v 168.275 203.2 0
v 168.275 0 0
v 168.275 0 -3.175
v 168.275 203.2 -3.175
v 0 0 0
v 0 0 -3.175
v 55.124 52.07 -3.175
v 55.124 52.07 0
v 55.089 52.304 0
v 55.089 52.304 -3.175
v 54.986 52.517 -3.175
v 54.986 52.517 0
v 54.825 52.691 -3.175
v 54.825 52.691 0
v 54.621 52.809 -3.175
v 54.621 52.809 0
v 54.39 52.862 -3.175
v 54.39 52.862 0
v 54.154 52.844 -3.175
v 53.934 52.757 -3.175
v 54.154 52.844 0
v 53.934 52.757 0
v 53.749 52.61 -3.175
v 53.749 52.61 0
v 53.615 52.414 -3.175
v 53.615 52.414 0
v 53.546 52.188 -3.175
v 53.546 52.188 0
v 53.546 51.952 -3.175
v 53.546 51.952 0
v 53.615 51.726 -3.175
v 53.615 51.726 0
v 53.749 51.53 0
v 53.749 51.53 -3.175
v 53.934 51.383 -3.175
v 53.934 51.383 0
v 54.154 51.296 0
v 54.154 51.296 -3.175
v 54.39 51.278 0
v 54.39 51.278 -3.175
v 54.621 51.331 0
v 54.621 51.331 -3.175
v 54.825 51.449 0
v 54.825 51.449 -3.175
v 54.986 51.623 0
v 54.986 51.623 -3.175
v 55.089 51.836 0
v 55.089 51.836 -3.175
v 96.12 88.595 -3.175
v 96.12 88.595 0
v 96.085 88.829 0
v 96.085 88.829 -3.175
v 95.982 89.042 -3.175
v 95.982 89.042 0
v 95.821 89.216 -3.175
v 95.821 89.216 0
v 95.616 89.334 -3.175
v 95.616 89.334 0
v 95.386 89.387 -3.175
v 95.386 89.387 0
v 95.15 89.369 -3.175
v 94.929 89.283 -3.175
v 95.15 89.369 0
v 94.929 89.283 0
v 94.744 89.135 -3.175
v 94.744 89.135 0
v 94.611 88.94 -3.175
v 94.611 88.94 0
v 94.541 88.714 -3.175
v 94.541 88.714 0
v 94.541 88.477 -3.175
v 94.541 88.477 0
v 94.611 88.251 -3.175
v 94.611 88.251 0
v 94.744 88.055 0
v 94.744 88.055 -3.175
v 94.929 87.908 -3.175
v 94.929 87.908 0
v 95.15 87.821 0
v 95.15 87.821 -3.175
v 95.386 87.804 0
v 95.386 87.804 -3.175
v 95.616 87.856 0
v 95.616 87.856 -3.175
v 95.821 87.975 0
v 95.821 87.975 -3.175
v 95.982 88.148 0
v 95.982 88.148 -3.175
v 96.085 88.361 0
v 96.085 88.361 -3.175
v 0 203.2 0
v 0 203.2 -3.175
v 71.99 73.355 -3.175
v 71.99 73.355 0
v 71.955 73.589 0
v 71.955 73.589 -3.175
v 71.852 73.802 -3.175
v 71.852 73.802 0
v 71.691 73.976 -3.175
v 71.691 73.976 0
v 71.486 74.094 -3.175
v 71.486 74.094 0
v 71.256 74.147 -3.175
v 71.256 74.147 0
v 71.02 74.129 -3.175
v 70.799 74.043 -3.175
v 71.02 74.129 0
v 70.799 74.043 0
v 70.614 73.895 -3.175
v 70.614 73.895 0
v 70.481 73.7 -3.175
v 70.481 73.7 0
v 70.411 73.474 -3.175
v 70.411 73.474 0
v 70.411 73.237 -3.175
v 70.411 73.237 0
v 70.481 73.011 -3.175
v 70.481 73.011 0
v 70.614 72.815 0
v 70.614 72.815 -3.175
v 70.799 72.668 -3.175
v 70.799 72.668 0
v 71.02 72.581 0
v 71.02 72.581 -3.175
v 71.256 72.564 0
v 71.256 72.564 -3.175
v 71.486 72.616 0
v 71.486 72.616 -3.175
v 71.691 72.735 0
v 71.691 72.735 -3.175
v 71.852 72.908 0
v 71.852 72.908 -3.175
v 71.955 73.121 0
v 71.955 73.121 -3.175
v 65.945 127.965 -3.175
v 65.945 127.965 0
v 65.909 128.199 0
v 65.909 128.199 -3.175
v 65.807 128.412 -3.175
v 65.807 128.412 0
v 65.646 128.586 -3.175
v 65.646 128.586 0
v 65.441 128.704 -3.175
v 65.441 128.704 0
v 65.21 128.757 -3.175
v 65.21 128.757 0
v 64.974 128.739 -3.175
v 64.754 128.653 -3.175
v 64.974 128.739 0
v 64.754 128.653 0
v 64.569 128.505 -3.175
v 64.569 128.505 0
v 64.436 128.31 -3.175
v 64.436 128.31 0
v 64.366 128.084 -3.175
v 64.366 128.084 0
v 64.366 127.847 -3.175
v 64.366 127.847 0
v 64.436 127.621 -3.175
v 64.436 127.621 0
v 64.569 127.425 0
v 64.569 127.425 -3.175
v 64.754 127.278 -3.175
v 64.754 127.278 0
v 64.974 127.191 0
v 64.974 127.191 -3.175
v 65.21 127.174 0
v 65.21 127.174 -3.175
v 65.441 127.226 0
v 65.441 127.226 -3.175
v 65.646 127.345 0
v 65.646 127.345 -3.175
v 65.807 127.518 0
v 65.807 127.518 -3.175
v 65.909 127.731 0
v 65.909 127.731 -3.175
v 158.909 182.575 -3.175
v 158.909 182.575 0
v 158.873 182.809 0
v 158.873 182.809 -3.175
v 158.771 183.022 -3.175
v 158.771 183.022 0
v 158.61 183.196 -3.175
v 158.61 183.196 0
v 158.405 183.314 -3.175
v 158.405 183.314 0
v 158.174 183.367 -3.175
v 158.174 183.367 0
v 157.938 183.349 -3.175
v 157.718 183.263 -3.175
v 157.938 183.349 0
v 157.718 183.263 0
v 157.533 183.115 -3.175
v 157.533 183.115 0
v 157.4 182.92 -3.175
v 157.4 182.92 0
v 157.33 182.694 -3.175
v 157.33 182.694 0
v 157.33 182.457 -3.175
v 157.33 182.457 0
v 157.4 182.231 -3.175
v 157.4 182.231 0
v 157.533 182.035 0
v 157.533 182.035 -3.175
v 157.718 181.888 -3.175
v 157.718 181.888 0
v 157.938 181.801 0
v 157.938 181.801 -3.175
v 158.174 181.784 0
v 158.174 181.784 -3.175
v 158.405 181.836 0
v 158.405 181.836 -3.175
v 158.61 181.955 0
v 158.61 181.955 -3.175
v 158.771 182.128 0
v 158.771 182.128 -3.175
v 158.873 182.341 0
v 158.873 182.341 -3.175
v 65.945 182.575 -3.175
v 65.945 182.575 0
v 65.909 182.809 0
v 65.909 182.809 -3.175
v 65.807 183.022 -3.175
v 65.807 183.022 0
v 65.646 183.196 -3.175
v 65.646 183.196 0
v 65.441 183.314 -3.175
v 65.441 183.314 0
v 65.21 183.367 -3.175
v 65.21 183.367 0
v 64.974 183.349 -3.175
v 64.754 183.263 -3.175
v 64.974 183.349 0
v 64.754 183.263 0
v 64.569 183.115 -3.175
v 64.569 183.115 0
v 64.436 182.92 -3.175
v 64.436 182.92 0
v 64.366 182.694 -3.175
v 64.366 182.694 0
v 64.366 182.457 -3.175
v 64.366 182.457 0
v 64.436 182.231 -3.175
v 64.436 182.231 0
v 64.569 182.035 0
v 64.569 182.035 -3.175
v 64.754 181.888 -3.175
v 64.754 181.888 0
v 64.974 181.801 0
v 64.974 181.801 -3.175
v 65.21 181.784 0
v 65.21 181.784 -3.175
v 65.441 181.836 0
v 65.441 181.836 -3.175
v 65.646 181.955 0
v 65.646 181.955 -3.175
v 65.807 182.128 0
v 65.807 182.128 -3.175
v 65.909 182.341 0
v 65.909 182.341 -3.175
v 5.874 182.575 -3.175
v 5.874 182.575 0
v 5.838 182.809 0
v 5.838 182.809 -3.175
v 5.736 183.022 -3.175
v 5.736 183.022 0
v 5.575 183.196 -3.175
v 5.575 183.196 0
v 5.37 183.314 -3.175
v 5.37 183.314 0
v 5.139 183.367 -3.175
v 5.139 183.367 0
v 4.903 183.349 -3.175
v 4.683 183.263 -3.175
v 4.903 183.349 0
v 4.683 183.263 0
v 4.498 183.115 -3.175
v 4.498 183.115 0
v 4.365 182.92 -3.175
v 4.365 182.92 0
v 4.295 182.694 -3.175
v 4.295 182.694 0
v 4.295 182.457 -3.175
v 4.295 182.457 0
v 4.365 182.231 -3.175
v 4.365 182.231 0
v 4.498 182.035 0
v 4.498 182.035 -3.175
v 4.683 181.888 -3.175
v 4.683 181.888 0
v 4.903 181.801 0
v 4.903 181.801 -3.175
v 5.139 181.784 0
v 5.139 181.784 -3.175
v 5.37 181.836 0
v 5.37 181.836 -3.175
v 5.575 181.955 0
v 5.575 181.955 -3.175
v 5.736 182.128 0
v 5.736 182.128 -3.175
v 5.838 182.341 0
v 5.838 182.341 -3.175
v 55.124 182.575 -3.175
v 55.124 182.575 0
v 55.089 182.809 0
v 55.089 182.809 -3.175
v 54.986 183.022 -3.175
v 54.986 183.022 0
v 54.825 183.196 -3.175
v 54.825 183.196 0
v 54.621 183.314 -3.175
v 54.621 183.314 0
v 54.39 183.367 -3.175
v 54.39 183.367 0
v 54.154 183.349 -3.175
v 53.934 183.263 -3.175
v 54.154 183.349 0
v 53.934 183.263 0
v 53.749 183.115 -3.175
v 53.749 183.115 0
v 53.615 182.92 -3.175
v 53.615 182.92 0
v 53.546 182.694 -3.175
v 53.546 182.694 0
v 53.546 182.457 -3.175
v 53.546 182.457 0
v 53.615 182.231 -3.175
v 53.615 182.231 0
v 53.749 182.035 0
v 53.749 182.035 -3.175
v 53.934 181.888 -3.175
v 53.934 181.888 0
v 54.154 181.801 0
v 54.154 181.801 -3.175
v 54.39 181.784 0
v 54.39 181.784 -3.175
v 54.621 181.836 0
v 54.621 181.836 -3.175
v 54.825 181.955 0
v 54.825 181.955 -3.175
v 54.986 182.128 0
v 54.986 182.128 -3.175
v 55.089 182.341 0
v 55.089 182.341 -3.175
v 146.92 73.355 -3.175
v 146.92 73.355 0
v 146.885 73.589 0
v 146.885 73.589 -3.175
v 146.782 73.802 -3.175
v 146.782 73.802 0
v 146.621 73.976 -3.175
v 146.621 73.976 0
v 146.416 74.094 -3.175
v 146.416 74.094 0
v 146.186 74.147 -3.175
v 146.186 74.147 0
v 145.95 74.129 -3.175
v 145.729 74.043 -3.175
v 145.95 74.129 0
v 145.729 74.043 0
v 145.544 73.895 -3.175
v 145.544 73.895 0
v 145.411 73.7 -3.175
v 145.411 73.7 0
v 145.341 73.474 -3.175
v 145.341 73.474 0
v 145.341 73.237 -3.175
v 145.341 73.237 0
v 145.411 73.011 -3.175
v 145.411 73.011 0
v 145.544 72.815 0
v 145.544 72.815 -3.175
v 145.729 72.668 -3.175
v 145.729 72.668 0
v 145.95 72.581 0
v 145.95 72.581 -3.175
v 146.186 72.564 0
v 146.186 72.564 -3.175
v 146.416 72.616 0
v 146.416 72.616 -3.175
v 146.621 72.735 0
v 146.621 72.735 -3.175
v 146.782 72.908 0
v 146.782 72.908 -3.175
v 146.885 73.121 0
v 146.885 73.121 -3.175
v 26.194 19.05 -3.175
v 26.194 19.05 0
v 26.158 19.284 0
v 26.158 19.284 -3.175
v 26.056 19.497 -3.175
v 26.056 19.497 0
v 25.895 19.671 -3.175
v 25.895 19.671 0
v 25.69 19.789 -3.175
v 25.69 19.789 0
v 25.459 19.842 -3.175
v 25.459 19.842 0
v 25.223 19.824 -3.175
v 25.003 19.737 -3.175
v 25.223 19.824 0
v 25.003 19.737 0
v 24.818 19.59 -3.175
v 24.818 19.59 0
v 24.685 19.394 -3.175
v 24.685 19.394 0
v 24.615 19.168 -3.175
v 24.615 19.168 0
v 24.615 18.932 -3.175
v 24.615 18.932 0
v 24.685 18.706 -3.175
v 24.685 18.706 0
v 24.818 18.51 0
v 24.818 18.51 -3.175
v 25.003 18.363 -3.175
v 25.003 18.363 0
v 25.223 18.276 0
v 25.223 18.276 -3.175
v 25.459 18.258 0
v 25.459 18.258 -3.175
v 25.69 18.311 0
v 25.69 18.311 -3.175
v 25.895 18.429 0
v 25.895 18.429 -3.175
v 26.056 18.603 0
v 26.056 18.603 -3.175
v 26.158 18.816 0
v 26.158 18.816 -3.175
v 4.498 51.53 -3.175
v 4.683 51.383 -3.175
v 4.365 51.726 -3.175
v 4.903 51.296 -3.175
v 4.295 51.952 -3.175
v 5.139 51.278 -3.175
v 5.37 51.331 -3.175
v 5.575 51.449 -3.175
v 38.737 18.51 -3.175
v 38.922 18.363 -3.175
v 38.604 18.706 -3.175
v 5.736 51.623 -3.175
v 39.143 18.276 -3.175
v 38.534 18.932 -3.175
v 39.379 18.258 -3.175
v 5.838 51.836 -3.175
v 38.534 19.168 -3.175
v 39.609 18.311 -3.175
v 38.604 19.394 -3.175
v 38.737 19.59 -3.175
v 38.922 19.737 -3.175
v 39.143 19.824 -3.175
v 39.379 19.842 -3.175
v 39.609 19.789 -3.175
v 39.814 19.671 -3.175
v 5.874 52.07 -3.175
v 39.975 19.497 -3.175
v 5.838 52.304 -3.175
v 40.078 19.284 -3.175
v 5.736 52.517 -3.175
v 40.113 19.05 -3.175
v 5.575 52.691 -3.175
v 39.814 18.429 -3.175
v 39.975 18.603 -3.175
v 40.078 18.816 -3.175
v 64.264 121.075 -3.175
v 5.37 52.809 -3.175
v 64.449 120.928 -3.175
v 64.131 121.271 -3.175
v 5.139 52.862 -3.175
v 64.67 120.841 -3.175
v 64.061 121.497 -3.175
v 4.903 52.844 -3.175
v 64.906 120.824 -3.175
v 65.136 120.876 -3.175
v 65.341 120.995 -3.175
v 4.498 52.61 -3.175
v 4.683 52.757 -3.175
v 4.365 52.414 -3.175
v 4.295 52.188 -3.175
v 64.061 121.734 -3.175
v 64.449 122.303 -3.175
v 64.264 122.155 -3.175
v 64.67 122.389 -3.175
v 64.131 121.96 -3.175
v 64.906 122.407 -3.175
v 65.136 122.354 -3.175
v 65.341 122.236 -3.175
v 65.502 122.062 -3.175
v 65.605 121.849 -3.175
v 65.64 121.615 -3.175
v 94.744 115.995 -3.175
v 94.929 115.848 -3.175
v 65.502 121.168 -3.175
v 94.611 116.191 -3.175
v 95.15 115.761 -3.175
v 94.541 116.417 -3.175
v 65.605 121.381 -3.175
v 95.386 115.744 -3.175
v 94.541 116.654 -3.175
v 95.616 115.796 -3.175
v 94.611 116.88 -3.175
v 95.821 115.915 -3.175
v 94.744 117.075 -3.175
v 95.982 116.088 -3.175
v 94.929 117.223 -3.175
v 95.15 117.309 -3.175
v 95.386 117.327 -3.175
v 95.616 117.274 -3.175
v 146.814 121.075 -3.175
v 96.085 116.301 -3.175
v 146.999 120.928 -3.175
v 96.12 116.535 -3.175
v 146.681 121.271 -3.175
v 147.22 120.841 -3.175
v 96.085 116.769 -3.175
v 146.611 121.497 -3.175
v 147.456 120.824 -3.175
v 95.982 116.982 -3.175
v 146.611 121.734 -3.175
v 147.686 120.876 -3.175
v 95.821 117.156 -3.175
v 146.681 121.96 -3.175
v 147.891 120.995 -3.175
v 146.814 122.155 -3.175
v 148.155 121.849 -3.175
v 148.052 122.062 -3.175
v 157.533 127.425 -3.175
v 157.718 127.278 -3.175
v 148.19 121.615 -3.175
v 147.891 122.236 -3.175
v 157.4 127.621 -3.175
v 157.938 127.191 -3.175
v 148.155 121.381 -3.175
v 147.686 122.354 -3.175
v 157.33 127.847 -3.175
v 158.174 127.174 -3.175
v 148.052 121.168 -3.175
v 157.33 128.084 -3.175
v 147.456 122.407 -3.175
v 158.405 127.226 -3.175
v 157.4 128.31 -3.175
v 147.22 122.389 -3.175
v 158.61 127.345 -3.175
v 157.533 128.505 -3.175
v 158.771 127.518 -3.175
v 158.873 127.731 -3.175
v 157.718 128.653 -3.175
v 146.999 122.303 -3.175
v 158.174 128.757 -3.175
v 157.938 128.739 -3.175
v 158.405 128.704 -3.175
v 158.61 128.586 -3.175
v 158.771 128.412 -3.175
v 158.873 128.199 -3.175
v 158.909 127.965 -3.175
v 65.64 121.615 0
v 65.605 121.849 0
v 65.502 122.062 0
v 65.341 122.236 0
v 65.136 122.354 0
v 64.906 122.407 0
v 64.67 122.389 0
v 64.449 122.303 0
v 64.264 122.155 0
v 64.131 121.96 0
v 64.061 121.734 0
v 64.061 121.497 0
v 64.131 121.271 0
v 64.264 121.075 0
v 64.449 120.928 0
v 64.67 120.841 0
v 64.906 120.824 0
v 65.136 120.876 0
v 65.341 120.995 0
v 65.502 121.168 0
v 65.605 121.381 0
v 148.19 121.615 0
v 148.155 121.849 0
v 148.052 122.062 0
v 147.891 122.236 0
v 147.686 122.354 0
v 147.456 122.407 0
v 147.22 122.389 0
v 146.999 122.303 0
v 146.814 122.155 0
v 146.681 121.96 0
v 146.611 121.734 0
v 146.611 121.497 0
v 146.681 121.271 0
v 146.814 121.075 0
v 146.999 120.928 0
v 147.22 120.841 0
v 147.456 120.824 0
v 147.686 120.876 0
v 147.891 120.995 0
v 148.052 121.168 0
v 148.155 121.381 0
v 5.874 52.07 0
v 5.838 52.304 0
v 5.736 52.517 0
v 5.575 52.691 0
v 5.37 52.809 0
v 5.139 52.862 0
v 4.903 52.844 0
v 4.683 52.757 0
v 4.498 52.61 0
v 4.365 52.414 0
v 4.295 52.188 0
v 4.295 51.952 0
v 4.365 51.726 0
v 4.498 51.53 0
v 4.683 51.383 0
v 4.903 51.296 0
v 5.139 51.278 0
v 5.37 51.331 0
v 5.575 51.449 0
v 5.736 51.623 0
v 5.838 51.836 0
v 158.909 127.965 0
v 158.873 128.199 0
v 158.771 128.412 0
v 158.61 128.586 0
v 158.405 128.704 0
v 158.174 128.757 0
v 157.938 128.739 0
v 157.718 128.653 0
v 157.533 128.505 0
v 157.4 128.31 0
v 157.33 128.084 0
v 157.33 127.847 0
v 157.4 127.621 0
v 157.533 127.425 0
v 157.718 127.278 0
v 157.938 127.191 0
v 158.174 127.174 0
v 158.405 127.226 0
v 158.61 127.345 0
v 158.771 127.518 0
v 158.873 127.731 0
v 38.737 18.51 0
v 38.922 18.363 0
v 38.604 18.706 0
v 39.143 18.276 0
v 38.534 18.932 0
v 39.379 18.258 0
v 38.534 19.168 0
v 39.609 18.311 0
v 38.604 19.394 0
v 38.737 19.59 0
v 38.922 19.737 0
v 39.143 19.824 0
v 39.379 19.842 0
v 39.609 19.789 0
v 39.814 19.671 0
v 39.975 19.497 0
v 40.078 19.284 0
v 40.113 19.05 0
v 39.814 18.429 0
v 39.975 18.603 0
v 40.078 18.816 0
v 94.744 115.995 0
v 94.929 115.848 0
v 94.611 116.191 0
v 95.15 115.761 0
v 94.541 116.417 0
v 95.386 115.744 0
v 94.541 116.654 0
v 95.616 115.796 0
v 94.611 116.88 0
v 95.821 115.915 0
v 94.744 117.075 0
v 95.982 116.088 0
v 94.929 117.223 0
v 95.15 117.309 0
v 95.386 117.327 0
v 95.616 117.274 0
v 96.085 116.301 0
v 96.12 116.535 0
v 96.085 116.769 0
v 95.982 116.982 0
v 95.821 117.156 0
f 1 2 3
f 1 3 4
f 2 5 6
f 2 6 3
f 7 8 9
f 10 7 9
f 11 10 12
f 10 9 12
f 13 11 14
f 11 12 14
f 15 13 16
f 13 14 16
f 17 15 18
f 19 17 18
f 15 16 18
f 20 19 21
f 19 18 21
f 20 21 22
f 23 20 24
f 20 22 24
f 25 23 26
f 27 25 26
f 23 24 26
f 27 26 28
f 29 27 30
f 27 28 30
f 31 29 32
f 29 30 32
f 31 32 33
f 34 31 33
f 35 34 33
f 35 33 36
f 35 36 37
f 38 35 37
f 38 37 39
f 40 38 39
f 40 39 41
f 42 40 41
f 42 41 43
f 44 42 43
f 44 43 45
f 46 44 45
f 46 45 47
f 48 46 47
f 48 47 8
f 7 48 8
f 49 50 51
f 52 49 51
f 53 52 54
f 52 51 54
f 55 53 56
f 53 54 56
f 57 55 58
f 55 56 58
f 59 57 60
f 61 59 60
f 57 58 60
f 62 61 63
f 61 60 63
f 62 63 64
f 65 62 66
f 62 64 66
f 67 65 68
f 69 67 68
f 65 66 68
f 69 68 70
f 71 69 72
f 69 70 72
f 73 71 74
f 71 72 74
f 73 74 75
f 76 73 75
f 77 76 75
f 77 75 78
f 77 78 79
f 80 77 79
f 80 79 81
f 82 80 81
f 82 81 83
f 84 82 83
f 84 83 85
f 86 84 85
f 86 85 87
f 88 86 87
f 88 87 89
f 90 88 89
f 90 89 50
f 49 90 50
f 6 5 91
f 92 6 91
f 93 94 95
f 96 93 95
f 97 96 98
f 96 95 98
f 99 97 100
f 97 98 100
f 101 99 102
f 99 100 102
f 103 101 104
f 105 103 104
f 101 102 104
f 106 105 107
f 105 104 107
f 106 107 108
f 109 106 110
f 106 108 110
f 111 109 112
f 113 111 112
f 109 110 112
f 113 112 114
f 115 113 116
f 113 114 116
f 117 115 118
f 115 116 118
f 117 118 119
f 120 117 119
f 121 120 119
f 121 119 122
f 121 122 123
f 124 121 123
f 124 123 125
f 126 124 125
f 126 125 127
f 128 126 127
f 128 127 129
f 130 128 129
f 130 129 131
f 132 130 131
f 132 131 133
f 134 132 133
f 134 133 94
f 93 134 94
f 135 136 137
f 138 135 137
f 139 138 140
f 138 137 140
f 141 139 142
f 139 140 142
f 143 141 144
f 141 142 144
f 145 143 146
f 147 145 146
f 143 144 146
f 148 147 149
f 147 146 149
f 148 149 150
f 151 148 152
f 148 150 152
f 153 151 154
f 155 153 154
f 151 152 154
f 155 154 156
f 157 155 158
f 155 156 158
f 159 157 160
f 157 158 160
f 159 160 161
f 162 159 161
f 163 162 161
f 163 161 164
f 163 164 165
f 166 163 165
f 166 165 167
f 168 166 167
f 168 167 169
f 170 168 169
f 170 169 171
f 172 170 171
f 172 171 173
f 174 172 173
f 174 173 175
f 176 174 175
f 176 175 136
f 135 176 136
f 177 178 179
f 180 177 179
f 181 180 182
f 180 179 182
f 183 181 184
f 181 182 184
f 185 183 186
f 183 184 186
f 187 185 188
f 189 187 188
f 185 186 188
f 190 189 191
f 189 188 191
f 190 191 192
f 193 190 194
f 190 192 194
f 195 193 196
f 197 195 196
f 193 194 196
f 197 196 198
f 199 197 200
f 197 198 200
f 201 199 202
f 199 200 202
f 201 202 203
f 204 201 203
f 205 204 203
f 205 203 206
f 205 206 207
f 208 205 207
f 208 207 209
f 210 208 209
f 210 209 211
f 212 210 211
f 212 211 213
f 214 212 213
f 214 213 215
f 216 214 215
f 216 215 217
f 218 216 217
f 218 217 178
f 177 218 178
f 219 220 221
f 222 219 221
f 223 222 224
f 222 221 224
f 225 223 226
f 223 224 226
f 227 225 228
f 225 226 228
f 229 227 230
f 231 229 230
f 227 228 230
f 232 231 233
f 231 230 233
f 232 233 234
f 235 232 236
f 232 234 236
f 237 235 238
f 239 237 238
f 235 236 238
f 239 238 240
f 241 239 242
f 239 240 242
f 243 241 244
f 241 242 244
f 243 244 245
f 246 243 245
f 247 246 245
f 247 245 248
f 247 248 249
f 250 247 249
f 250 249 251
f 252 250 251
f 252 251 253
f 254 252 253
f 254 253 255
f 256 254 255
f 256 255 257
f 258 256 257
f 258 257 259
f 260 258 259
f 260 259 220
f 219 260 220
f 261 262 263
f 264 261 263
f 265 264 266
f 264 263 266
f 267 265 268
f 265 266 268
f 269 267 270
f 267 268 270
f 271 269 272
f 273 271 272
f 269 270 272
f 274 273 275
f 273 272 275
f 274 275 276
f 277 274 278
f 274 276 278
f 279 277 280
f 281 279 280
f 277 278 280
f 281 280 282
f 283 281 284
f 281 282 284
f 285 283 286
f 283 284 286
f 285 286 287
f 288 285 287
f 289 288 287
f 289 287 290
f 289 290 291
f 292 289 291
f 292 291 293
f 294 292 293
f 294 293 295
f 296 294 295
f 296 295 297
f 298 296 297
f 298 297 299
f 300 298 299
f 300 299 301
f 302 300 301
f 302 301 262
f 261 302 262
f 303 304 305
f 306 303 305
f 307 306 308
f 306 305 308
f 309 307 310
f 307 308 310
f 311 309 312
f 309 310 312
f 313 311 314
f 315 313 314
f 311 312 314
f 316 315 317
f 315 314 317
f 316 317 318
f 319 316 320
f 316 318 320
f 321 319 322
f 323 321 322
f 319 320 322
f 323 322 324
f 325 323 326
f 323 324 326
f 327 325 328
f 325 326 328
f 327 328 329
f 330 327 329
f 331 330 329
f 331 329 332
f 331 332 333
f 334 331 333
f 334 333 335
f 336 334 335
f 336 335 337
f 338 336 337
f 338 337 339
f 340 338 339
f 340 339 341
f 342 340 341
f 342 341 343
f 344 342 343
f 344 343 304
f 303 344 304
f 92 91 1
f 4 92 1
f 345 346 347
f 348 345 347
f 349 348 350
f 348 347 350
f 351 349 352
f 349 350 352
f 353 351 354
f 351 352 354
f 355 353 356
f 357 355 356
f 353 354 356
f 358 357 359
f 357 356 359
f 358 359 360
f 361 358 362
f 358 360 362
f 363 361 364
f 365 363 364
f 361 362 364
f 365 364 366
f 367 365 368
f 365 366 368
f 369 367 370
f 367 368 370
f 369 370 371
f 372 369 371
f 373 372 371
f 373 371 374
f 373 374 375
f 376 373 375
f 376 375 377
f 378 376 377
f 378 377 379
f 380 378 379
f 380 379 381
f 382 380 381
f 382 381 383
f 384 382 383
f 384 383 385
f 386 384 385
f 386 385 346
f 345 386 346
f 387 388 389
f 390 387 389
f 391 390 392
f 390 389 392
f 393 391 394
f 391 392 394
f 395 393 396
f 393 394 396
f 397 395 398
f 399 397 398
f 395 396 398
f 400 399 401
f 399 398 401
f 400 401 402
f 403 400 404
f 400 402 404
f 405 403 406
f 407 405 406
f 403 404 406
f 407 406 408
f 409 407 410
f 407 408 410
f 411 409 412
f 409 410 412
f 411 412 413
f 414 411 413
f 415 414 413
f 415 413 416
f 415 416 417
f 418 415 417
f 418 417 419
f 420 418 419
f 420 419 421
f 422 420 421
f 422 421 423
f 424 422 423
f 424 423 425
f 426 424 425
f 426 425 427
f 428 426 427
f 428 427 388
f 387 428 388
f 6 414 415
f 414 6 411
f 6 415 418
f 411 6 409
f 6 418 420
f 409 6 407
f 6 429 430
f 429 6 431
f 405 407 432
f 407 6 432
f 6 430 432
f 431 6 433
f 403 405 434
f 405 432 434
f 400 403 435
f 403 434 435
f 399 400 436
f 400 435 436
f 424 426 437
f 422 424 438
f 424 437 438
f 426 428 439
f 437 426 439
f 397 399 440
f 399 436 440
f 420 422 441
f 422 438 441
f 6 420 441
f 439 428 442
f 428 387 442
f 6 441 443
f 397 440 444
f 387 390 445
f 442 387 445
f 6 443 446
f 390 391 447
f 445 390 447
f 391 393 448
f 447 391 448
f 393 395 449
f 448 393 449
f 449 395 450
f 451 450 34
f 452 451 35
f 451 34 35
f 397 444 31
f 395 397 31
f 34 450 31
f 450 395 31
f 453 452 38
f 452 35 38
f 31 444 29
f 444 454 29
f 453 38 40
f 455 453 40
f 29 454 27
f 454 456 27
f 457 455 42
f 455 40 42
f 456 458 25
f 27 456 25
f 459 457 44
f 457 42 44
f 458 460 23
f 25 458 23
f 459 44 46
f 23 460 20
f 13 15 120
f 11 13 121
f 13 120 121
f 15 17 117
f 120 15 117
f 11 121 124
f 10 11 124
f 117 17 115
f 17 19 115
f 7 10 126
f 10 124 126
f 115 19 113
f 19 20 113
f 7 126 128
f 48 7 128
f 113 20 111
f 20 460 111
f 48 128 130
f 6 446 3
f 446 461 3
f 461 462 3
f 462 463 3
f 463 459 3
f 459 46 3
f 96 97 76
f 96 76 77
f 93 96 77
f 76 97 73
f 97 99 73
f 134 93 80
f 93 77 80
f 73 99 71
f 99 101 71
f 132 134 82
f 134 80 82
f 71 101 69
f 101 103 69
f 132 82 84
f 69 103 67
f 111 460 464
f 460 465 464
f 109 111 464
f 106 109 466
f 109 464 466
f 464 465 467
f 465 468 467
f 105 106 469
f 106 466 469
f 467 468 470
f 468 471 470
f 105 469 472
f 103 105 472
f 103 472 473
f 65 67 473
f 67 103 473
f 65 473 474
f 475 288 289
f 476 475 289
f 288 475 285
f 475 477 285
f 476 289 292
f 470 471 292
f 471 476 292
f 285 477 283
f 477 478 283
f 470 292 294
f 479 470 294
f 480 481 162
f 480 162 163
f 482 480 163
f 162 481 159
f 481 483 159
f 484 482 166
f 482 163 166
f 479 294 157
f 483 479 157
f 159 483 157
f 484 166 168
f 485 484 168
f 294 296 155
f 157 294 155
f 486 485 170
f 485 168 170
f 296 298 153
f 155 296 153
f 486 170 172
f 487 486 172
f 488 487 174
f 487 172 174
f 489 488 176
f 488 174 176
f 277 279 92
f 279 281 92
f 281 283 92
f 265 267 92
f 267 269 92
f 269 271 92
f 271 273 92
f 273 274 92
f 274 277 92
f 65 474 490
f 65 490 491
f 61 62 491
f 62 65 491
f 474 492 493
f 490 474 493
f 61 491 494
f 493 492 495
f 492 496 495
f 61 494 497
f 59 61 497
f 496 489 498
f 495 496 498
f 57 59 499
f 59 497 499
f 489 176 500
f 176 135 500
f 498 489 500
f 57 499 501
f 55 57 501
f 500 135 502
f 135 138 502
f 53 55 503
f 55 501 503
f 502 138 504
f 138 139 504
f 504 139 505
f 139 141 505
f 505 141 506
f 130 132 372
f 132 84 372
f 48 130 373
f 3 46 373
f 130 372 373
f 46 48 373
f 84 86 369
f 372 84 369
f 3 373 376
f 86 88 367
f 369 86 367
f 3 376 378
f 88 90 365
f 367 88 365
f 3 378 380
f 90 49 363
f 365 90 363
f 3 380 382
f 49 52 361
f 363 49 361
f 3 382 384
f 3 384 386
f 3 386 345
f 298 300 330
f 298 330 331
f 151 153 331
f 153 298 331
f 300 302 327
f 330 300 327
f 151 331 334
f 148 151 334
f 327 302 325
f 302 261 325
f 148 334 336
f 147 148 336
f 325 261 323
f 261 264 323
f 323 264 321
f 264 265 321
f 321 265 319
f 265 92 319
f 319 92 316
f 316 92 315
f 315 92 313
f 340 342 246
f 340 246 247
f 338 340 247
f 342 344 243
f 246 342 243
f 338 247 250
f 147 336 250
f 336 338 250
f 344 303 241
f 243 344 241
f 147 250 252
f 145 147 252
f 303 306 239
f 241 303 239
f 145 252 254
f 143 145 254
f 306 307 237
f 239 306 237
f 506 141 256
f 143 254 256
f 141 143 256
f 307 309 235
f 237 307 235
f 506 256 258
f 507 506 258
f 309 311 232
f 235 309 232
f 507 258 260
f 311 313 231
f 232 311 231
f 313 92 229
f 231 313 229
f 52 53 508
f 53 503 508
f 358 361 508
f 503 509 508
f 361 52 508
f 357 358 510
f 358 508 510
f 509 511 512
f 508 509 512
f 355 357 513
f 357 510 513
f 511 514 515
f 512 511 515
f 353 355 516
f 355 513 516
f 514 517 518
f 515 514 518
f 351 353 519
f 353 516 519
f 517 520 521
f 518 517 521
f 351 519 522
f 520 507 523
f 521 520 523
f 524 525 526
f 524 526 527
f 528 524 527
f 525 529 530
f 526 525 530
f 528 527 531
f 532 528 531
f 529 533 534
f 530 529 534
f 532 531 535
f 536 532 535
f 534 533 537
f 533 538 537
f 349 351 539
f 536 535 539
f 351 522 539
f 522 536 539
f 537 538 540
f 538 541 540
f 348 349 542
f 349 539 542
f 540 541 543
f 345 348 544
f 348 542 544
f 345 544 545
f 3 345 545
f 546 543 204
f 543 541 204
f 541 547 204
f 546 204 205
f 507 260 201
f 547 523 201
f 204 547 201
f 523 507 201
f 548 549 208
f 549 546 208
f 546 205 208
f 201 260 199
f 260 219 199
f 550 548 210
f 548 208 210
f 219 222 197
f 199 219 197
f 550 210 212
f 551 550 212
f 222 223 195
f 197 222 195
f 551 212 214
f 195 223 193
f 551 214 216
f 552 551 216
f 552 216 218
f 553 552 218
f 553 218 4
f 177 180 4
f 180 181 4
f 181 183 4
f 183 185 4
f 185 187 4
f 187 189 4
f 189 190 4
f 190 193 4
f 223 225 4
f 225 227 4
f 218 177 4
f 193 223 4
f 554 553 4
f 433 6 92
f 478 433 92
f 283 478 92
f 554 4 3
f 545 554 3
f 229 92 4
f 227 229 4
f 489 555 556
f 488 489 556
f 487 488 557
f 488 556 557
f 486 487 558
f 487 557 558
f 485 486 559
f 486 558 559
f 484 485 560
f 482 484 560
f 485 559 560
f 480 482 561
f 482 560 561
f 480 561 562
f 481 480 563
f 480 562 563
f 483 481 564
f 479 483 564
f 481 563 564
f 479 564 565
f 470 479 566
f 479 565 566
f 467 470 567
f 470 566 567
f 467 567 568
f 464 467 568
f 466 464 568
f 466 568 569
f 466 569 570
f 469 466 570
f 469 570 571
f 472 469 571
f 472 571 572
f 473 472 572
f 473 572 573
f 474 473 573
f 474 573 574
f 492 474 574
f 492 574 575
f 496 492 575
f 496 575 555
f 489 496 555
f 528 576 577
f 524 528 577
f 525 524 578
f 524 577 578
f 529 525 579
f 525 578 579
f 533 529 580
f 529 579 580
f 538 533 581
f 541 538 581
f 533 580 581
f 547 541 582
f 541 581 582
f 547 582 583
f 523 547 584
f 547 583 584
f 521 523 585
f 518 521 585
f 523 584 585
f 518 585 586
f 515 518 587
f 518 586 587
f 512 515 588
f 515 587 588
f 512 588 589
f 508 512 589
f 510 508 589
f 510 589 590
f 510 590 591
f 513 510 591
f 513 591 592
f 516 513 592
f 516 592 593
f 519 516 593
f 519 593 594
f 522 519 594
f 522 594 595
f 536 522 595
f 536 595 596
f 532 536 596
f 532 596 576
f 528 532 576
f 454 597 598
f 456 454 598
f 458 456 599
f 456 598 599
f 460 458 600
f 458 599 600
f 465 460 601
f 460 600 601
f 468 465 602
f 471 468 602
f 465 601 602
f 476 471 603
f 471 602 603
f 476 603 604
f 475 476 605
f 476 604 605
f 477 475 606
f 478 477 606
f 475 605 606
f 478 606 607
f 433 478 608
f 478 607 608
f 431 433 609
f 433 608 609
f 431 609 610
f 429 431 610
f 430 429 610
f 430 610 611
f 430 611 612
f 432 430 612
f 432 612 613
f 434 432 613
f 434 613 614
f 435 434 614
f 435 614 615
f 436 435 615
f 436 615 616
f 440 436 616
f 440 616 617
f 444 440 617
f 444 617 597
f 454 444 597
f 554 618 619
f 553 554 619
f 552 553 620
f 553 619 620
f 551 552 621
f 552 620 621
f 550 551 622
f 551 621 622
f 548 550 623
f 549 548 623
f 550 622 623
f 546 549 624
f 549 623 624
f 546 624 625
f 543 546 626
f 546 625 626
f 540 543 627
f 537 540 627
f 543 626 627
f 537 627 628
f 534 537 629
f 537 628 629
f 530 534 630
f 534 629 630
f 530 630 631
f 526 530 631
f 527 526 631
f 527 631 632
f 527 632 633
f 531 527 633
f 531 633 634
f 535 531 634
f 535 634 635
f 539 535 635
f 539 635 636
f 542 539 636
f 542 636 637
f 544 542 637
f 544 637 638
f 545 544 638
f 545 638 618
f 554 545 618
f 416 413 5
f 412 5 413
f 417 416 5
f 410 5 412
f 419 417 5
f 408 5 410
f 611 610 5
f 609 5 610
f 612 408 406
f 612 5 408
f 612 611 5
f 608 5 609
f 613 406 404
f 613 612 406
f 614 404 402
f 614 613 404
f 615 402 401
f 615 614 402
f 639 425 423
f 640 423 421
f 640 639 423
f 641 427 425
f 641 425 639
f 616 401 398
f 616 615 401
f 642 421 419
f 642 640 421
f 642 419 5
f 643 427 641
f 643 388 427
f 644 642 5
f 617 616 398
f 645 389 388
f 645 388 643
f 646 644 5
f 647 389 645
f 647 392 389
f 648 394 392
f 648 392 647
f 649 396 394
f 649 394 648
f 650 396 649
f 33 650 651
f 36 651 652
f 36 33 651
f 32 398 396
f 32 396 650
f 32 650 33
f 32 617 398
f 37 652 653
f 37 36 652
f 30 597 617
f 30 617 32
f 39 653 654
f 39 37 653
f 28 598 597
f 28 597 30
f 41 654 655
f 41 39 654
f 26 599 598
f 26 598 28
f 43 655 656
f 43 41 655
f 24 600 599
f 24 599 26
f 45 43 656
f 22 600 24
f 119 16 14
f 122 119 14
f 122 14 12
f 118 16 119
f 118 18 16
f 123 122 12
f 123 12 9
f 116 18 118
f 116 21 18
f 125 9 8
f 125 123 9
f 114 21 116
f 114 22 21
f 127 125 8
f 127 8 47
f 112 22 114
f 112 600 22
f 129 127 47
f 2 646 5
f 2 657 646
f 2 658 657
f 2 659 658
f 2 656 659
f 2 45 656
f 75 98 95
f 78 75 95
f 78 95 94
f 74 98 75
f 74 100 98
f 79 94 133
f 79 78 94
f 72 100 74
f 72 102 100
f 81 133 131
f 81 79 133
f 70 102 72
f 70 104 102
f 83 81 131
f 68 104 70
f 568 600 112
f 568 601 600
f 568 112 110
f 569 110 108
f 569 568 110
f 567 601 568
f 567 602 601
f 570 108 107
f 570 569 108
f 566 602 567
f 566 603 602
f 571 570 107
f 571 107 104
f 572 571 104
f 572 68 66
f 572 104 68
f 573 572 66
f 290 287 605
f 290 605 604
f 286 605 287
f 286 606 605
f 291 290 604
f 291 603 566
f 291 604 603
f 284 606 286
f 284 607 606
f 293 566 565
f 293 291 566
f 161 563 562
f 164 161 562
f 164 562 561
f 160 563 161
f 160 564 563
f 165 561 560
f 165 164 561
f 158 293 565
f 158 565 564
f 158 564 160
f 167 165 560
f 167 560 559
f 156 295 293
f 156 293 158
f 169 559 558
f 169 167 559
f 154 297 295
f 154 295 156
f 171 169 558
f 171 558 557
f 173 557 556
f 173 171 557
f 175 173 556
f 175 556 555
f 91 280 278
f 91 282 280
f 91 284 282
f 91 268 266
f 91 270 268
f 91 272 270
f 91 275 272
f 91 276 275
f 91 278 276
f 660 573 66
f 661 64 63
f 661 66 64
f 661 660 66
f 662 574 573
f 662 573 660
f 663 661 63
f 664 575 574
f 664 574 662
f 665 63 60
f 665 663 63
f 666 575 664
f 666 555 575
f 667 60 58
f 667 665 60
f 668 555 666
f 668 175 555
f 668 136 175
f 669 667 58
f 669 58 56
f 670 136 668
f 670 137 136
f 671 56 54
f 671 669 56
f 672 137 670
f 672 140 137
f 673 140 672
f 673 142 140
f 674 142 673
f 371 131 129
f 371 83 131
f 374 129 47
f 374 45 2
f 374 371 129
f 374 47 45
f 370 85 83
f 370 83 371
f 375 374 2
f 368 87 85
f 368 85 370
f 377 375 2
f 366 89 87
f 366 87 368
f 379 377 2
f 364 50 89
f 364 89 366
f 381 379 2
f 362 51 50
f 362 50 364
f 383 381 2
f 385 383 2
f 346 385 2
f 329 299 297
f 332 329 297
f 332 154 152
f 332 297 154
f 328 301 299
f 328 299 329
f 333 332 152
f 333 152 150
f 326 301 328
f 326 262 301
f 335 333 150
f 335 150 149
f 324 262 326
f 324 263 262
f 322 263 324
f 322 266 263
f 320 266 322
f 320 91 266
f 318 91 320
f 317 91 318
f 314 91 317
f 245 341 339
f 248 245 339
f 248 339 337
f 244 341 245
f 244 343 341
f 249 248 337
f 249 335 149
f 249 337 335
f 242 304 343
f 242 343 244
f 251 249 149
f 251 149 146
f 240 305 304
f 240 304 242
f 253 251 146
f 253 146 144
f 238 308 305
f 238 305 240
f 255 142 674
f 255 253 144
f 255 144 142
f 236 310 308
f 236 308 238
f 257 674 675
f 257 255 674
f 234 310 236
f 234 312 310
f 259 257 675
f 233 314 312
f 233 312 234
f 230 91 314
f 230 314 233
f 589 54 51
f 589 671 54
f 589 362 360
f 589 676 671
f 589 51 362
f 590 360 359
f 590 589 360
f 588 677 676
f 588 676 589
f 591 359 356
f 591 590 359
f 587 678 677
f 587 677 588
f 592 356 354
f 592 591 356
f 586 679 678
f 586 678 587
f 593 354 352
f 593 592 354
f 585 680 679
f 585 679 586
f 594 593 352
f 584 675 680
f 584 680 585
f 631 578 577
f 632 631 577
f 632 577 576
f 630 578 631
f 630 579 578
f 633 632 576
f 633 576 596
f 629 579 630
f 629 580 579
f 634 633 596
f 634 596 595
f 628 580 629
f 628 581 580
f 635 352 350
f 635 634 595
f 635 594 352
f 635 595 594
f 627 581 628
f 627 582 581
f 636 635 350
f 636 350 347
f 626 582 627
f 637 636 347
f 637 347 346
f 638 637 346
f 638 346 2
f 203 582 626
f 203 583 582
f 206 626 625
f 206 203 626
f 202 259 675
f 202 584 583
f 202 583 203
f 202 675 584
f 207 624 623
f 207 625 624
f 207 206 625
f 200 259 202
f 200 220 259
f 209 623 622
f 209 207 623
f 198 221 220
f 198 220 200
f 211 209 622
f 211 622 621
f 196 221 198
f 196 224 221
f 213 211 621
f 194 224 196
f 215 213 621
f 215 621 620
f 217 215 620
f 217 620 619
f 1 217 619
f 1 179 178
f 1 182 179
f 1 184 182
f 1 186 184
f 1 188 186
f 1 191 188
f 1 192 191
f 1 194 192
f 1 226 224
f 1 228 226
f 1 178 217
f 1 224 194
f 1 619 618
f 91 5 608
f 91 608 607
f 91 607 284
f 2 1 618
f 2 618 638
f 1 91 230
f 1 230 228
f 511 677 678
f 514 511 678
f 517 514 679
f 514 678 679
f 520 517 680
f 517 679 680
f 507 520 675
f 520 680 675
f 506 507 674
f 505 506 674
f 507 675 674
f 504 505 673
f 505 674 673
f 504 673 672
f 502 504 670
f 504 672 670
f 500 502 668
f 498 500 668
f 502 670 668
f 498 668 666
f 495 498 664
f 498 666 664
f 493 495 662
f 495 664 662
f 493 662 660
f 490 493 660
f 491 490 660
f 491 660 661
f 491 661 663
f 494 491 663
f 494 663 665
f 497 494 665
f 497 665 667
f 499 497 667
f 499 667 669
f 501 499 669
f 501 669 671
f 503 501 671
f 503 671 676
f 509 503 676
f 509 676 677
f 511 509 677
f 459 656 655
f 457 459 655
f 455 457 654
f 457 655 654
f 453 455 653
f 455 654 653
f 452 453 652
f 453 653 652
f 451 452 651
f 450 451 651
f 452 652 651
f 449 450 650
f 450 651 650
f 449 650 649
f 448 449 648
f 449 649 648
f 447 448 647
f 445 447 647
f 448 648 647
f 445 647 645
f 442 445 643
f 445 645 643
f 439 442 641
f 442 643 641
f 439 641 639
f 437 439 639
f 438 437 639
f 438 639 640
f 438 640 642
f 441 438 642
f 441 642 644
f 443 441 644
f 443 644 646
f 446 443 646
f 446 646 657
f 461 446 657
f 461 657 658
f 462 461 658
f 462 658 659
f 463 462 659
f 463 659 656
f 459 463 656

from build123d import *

# Parameters (mm, degrees)
F0_W     = 168.275
F0_H     = 203.2
F2_DEPTH = 3.175
F1_R     = 0.79375
F3_DEPTH = 25.4
F4_R     = 0.79375
F5_DEPTH = 25.4
F6_R     = 0.79375
F7_DEPTH = 25.4
F8_R     = 0.79375
F9_DEPTH = 25.4


with BuildPart() as f2:
    # F0 (on Top) → F2 (new body)
    with BuildSketch(Plane.XY):
        with Locations((84.1375, 101.6)):
            Rectangle(F0_W, F0_H)
    extrude(amount=-F2_DEPTH)

    # F1 (on Top) → F3 (cut)
    with BuildSketch(Plane.XY):
        with Locations((71.1962, 73.3552)):
            Circle(F1_R)
        with Locations((64.8462, 121.6152)):
            Circle(F1_R)
        with Locations((95.3262, 116.5352)):
            Circle(F1_R)
        with Locations((146.1262, 73.3552)):
            Circle(F1_R)
        with Locations((147.3962, 121.6152)):
            Circle(F1_R)
        with Locations((95.3262, 88.5952)):
            Circle(F1_R)
    extrude(amount=-F3_DEPTH, mode=Mode.SUBTRACT)

    # F4 (on Top) → F5 (cut)
    with BuildSketch(Plane.XY):
        with Locations((65.151, 127.9652)):
            Circle(F4_R)
        with Locations((158.115, 127.9652)):
            Circle(F4_R)
        with Locations((158.115, 182.5752)):
            Circle(F4_R)
        with Locations((65.151, 182.5752)):
            Circle(F4_R)
    extrude(amount=-F5_DEPTH, mode=Mode.SUBTRACT)

    # F6 (on Top) → F7 (cut)
    with BuildSketch(Plane.XY):
        with Locations((5.08, 52.07)):
            Circle(F6_R)
        with Locations((54.3306, 52.07)):
            Circle(F6_R)
        with Locations((54.3306, 182.5752)):
            Circle(F6_R)
        with Locations((5.08, 182.5752)):
            Circle(F6_R)
    extrude(amount=-F7_DEPTH, mode=Mode.SUBTRACT)

    # F8 (on Top) → F9 (cut)
    with BuildSketch(Plane.XY):
        with Locations((25.4, 19.05)):
            Circle(F8_R)
        with Locations((39.3192, 19.05)):
            Circle(F8_R)
    extrude(amount=-F9_DEPTH, mode=Mode.SUBTRACT)


solid = f2.part
